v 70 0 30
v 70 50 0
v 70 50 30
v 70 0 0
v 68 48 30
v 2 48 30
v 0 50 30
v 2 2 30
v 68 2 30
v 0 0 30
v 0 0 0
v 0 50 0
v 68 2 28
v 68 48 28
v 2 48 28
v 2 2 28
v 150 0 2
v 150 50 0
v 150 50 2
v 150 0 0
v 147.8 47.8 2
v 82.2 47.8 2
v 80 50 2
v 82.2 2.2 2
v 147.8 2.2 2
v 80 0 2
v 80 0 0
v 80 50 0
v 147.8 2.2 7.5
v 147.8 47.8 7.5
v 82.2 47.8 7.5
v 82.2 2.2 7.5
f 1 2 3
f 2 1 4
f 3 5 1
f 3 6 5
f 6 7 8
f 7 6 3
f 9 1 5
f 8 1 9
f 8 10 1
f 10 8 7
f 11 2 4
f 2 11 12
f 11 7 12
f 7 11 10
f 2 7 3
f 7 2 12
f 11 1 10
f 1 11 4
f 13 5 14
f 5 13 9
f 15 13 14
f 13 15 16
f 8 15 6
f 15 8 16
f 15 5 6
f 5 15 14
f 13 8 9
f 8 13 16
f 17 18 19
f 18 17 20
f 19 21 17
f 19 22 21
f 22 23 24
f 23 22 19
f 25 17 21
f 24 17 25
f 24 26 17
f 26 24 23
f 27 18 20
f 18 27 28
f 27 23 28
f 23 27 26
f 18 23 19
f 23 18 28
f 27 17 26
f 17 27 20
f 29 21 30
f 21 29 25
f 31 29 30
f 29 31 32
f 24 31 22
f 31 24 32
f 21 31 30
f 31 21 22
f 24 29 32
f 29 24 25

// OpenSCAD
// Two-part enclosure for a small electronics board (e.g. Arduino-based temperature logger)
// Print orientation: both parts lie on the bed (z = 0), side by side, with a 10 mm gap.
// Units: mm

// ---------------- Parameters ----------------
box_x      = 70;    // box outer length (X)
box_y      = 50;    // box outer width (Y)
box_z      = 30;    // box outer height (Z)
wall       = 2;     // box wall thickness
floor      = 2;     // box floor thickness
lip_t      = 1.5;   // lid lip wall thickness
lip_h      = 4;     // lid lip height (from plate top)
lip_outer_x = 65.6; // outer size of lip in X
lip_outer_y = 45.6; // outer size of lip in Y
clearance  = 0.2;   // clearance between lip outer size and box opening
gap        = 10;    // gap between box and lid
eps        = 0.5;   // cutter overshoot past faces

$fn = 64;

// Derived
box_inner_x = box_x - 2 * wall;
box_inner_y = box_y - 2 * wall;
box_inner_z = box_z - floor - wall;   // open-top height
lip_overlap = clearance + wall;       // lip extends into box by clearance + wall (0.2+2=2.2)

// ---------------- Modules ----------------
module box() {
    difference() {
        translate([0, 0, 0])
            cube([box_x, box_y, box_z]);
        // open top: empty space above the top wall
        translate([wall, wall, box_z - wall])
            cube([box_inner_x, box_inner_y, wall + eps]);
    }
}

module lid() {
    // Plate lying on the bed
    translate([0, 0, 0])
        cube([box_x, box_y, 2]);
    // Rectangular lip centred on the plate, printed upside down
    translate([(box_x - lip_outer_x) / 2, (box_y - lip_outer_y) / 2, 2])
        cube([lip_outer_x, lip_outer_y, lip_t + lip_h]);
}

// ---------------- Assembly ----------------
union() {
    box();
    translate([box_x + gap, 0, 0])
        lid();
}
